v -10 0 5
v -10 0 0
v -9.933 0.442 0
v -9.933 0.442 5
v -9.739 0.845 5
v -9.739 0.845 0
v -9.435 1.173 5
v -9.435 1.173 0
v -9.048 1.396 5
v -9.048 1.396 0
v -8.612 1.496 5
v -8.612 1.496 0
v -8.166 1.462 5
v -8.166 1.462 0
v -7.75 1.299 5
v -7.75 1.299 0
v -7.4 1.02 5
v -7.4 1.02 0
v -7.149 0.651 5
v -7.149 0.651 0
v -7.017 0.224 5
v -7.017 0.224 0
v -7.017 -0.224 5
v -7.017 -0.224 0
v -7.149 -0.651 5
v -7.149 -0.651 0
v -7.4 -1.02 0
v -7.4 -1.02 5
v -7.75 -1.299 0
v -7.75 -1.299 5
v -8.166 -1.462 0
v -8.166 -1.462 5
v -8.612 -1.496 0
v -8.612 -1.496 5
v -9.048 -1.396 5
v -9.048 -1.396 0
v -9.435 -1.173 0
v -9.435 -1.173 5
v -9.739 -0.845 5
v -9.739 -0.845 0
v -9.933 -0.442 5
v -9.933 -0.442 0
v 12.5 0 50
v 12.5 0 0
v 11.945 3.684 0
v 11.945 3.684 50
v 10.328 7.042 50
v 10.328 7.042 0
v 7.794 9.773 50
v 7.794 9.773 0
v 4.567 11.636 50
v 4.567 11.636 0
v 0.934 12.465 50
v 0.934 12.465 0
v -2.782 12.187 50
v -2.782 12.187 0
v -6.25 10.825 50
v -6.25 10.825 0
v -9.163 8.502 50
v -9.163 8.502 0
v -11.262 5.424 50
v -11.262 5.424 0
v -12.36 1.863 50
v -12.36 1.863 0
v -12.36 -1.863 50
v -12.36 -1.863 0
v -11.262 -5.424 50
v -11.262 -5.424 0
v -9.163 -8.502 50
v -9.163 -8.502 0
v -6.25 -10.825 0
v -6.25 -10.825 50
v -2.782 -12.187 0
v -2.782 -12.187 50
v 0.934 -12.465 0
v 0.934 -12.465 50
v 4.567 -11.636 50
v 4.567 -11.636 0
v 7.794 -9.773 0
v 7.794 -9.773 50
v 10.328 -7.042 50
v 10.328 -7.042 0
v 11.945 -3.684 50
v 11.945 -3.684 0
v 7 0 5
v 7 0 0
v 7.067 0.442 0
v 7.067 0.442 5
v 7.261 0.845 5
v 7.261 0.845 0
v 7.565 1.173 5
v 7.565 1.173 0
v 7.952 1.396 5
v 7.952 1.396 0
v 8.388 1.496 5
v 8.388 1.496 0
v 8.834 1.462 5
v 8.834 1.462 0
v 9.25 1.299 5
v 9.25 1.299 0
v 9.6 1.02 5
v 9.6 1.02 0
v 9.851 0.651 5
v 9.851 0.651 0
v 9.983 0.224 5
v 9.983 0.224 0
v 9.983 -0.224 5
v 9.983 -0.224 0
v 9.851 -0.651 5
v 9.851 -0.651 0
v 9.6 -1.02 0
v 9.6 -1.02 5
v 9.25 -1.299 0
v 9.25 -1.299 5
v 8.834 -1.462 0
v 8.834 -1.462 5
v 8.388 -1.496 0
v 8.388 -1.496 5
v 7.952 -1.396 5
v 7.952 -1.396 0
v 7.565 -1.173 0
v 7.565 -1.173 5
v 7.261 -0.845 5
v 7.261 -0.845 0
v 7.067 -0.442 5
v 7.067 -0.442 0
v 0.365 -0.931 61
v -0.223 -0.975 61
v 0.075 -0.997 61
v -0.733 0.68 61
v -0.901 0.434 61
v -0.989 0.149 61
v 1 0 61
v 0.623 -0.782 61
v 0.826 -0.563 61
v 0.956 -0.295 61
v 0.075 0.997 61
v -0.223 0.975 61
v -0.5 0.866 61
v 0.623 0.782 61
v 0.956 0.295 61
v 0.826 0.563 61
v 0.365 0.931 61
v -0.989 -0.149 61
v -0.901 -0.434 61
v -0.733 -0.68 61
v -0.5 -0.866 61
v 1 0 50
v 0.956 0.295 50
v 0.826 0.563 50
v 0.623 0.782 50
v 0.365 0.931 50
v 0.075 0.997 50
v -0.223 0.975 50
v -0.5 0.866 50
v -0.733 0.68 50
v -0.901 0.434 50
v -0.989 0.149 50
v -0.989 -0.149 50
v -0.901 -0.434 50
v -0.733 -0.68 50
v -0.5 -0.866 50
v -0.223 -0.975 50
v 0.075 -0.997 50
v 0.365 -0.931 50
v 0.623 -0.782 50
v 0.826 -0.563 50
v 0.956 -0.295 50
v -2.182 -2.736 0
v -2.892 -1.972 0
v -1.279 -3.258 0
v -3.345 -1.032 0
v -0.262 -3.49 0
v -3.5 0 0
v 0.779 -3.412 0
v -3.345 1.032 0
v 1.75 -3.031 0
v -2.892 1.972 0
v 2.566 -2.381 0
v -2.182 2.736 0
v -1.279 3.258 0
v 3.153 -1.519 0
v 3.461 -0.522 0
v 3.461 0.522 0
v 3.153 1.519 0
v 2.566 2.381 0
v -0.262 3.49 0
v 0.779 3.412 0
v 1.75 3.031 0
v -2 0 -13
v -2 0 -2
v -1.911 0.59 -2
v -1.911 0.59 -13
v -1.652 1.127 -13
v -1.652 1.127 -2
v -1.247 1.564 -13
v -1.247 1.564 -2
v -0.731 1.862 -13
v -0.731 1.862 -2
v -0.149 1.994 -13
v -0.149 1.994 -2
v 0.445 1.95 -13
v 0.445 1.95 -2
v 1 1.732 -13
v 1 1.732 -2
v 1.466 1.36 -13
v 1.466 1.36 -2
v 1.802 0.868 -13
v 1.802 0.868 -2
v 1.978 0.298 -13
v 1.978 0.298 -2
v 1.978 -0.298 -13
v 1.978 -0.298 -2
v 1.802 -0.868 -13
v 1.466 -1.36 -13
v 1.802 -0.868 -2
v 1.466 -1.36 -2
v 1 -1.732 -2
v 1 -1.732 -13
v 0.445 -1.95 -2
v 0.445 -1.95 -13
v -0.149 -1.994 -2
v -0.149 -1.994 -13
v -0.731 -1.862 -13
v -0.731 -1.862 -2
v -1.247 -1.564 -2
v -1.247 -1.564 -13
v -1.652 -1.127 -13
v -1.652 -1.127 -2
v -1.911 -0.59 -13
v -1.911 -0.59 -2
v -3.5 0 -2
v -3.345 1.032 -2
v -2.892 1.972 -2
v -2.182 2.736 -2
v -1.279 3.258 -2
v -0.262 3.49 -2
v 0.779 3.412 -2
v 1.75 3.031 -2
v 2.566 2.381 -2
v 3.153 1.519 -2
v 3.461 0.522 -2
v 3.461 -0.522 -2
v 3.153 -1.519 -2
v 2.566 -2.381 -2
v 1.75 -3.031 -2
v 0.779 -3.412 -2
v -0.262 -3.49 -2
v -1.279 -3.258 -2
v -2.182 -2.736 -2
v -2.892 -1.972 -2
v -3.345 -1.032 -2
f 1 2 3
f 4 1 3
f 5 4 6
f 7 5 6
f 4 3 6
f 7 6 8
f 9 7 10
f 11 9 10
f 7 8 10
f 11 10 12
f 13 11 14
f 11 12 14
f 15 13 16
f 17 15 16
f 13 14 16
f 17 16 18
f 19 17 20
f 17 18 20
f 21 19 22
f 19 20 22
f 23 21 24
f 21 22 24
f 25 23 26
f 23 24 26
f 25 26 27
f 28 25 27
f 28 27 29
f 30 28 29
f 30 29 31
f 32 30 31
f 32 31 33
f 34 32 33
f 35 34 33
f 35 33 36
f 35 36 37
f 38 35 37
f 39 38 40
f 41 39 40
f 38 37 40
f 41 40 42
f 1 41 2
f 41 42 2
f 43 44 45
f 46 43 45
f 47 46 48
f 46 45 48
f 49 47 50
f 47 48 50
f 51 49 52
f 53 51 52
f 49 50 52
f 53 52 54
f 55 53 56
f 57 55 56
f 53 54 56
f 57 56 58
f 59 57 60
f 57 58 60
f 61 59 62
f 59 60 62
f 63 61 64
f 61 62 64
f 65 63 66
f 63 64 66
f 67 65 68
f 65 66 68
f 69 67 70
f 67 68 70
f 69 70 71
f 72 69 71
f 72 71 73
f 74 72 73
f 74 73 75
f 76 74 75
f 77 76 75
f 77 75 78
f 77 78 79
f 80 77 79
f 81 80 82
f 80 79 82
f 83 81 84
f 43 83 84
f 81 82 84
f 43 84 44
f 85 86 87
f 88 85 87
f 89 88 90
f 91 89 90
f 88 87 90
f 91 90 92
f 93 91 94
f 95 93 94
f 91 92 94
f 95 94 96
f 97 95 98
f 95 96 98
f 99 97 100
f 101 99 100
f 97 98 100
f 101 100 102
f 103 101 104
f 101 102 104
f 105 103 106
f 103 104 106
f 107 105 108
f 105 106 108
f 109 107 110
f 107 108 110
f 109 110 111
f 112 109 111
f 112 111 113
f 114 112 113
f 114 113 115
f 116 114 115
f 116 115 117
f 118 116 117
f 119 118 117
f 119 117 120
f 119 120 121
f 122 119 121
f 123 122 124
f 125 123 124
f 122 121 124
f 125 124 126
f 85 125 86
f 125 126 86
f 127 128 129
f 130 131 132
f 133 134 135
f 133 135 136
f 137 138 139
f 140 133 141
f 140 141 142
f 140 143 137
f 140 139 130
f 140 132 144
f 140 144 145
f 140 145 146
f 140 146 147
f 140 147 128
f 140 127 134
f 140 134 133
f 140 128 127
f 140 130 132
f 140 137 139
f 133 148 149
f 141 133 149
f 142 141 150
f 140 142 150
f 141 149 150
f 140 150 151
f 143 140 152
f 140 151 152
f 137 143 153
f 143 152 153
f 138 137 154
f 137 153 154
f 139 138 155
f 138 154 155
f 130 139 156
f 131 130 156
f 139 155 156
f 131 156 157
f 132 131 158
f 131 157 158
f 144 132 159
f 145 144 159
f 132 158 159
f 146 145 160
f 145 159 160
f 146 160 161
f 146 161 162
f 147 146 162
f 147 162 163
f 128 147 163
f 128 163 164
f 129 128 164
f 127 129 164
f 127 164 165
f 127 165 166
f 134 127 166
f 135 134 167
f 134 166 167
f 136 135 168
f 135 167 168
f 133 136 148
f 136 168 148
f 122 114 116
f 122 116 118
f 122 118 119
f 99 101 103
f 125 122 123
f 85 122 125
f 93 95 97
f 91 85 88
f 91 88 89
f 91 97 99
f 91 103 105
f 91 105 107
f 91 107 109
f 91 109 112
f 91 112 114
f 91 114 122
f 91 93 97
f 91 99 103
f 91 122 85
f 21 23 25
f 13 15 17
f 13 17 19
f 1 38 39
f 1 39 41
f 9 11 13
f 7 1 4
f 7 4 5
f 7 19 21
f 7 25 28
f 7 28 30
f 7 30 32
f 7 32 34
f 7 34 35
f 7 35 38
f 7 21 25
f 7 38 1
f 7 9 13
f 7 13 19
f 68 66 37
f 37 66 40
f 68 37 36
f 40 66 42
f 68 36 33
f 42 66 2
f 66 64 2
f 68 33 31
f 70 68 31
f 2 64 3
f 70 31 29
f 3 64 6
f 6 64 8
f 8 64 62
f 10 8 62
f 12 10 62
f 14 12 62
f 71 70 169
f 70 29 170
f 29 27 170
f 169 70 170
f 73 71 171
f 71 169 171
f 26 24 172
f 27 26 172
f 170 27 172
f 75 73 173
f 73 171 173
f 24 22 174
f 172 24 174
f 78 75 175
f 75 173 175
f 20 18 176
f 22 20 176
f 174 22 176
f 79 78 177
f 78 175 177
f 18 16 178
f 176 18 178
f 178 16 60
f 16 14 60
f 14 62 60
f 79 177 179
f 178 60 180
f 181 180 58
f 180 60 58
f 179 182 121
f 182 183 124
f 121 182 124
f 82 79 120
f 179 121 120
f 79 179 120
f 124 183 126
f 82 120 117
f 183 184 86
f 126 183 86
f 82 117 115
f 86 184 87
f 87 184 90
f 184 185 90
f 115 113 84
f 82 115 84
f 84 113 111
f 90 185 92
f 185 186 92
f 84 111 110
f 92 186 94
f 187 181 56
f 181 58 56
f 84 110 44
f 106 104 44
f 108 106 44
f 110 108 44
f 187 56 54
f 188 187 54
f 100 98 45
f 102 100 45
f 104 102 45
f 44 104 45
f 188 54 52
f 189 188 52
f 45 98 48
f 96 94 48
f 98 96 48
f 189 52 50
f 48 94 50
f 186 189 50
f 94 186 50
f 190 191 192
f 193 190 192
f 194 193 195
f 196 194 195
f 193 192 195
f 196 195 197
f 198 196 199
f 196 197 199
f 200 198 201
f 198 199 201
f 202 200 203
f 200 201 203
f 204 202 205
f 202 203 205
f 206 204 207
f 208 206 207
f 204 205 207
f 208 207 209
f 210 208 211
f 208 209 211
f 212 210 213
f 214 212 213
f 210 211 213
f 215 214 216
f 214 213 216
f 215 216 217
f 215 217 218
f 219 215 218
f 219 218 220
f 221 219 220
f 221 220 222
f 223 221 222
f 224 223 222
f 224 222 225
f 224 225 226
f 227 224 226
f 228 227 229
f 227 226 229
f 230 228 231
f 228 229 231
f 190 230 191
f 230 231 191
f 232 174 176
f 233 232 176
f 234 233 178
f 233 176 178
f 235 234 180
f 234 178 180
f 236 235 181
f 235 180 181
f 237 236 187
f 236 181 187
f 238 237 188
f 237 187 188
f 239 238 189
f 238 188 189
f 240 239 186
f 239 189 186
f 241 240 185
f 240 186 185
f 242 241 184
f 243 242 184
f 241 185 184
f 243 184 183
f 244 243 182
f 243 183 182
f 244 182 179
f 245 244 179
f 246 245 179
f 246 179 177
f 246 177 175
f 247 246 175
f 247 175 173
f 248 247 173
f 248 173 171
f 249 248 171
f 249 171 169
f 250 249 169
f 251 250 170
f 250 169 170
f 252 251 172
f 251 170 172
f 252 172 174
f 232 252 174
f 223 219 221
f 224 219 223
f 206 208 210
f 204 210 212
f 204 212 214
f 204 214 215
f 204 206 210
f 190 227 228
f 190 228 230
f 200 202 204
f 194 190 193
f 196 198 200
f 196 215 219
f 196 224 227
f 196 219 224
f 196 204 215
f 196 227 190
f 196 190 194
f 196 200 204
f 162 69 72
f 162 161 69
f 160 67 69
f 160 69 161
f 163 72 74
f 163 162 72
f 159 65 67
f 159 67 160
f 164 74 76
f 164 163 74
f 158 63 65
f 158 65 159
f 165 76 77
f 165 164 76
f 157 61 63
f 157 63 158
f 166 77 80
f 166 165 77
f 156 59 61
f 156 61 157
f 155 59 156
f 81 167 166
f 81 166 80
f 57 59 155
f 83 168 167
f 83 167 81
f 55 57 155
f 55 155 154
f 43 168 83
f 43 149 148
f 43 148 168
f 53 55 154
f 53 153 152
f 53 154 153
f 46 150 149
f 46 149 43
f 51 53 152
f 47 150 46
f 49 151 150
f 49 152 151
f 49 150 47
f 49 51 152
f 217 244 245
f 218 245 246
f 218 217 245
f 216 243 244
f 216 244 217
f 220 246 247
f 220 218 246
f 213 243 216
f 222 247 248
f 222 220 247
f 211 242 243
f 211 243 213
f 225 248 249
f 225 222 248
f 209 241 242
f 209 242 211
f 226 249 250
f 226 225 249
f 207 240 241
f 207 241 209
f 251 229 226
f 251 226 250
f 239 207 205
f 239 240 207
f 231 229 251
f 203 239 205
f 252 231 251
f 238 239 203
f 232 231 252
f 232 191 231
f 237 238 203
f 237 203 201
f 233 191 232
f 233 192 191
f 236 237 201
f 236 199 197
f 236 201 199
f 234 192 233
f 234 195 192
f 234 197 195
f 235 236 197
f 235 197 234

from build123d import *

# Parameters (mm, degrees)
SKETCH1_R           = 12.5
BOSS_EXTRUDE1_DEPTH = 50
SKETCH2_R           = 3.5
BOSS_EXTRUDE2_DEPTH = 2
SKETCH3_R           = 2
BOSS_EXTRUDE3_DEPTH = 11
SKETCH4_R           = 1.5
CUT_EXTRUDE1_DEPTH  = 5
SKETCH5_R           = 1
BOSS_EXTRUDE4_DEPTH = 11


with BuildPart() as part:
    # Sketch1 → Boss-Extrude1 (new body)
    with BuildSketch(Plane.XY):
        Circle(SKETCH1_R)
    extrude(amount=BOSS_EXTRUDE1_DEPTH)

    # Sketch2 → Boss-Extrude2 (add)
    with BuildSketch(Plane(origin=(0, 0, 0), x_dir=(-1, 0, 0), z_dir=(0, 0, -1))):
        Circle(SKETCH2_R)
    extrude(amount=BOSS_EXTRUDE2_DEPTH)

    # Sketch3 → Boss-Extrude3 (add)
    with BuildSketch(Plane(origin=(0, 0, -2), x_dir=(-1, 0, 0), z_dir=(0, 0, -1))):
        Circle(SKETCH3_R)
    extrude(amount=BOSS_EXTRUDE3_DEPTH)

    # Sketch4 → Cut-Extrude1 (cut)
    with BuildSketch(Plane(origin=(0, 0, 0), x_dir=(-1, 0, 0), z_dir=(0, 0, -1))):
        with Locations((-8.5, 0)):
            Circle(SKETCH4_R)
        with Locations((8.5, 0)):
            Circle(SKETCH4_R)
    extrude(amount=-CUT_EXTRUDE1_DEPTH, mode=Mode.SUBTRACT)

    # Sketch5 → Boss-Extrude4 (add)
    with BuildSketch(Plane.XY.offset(50)):
        Circle(SKETCH5_R)
    extrude(amount=BOSS_EXTRUDE4_DEPTH)


solid = part.part
